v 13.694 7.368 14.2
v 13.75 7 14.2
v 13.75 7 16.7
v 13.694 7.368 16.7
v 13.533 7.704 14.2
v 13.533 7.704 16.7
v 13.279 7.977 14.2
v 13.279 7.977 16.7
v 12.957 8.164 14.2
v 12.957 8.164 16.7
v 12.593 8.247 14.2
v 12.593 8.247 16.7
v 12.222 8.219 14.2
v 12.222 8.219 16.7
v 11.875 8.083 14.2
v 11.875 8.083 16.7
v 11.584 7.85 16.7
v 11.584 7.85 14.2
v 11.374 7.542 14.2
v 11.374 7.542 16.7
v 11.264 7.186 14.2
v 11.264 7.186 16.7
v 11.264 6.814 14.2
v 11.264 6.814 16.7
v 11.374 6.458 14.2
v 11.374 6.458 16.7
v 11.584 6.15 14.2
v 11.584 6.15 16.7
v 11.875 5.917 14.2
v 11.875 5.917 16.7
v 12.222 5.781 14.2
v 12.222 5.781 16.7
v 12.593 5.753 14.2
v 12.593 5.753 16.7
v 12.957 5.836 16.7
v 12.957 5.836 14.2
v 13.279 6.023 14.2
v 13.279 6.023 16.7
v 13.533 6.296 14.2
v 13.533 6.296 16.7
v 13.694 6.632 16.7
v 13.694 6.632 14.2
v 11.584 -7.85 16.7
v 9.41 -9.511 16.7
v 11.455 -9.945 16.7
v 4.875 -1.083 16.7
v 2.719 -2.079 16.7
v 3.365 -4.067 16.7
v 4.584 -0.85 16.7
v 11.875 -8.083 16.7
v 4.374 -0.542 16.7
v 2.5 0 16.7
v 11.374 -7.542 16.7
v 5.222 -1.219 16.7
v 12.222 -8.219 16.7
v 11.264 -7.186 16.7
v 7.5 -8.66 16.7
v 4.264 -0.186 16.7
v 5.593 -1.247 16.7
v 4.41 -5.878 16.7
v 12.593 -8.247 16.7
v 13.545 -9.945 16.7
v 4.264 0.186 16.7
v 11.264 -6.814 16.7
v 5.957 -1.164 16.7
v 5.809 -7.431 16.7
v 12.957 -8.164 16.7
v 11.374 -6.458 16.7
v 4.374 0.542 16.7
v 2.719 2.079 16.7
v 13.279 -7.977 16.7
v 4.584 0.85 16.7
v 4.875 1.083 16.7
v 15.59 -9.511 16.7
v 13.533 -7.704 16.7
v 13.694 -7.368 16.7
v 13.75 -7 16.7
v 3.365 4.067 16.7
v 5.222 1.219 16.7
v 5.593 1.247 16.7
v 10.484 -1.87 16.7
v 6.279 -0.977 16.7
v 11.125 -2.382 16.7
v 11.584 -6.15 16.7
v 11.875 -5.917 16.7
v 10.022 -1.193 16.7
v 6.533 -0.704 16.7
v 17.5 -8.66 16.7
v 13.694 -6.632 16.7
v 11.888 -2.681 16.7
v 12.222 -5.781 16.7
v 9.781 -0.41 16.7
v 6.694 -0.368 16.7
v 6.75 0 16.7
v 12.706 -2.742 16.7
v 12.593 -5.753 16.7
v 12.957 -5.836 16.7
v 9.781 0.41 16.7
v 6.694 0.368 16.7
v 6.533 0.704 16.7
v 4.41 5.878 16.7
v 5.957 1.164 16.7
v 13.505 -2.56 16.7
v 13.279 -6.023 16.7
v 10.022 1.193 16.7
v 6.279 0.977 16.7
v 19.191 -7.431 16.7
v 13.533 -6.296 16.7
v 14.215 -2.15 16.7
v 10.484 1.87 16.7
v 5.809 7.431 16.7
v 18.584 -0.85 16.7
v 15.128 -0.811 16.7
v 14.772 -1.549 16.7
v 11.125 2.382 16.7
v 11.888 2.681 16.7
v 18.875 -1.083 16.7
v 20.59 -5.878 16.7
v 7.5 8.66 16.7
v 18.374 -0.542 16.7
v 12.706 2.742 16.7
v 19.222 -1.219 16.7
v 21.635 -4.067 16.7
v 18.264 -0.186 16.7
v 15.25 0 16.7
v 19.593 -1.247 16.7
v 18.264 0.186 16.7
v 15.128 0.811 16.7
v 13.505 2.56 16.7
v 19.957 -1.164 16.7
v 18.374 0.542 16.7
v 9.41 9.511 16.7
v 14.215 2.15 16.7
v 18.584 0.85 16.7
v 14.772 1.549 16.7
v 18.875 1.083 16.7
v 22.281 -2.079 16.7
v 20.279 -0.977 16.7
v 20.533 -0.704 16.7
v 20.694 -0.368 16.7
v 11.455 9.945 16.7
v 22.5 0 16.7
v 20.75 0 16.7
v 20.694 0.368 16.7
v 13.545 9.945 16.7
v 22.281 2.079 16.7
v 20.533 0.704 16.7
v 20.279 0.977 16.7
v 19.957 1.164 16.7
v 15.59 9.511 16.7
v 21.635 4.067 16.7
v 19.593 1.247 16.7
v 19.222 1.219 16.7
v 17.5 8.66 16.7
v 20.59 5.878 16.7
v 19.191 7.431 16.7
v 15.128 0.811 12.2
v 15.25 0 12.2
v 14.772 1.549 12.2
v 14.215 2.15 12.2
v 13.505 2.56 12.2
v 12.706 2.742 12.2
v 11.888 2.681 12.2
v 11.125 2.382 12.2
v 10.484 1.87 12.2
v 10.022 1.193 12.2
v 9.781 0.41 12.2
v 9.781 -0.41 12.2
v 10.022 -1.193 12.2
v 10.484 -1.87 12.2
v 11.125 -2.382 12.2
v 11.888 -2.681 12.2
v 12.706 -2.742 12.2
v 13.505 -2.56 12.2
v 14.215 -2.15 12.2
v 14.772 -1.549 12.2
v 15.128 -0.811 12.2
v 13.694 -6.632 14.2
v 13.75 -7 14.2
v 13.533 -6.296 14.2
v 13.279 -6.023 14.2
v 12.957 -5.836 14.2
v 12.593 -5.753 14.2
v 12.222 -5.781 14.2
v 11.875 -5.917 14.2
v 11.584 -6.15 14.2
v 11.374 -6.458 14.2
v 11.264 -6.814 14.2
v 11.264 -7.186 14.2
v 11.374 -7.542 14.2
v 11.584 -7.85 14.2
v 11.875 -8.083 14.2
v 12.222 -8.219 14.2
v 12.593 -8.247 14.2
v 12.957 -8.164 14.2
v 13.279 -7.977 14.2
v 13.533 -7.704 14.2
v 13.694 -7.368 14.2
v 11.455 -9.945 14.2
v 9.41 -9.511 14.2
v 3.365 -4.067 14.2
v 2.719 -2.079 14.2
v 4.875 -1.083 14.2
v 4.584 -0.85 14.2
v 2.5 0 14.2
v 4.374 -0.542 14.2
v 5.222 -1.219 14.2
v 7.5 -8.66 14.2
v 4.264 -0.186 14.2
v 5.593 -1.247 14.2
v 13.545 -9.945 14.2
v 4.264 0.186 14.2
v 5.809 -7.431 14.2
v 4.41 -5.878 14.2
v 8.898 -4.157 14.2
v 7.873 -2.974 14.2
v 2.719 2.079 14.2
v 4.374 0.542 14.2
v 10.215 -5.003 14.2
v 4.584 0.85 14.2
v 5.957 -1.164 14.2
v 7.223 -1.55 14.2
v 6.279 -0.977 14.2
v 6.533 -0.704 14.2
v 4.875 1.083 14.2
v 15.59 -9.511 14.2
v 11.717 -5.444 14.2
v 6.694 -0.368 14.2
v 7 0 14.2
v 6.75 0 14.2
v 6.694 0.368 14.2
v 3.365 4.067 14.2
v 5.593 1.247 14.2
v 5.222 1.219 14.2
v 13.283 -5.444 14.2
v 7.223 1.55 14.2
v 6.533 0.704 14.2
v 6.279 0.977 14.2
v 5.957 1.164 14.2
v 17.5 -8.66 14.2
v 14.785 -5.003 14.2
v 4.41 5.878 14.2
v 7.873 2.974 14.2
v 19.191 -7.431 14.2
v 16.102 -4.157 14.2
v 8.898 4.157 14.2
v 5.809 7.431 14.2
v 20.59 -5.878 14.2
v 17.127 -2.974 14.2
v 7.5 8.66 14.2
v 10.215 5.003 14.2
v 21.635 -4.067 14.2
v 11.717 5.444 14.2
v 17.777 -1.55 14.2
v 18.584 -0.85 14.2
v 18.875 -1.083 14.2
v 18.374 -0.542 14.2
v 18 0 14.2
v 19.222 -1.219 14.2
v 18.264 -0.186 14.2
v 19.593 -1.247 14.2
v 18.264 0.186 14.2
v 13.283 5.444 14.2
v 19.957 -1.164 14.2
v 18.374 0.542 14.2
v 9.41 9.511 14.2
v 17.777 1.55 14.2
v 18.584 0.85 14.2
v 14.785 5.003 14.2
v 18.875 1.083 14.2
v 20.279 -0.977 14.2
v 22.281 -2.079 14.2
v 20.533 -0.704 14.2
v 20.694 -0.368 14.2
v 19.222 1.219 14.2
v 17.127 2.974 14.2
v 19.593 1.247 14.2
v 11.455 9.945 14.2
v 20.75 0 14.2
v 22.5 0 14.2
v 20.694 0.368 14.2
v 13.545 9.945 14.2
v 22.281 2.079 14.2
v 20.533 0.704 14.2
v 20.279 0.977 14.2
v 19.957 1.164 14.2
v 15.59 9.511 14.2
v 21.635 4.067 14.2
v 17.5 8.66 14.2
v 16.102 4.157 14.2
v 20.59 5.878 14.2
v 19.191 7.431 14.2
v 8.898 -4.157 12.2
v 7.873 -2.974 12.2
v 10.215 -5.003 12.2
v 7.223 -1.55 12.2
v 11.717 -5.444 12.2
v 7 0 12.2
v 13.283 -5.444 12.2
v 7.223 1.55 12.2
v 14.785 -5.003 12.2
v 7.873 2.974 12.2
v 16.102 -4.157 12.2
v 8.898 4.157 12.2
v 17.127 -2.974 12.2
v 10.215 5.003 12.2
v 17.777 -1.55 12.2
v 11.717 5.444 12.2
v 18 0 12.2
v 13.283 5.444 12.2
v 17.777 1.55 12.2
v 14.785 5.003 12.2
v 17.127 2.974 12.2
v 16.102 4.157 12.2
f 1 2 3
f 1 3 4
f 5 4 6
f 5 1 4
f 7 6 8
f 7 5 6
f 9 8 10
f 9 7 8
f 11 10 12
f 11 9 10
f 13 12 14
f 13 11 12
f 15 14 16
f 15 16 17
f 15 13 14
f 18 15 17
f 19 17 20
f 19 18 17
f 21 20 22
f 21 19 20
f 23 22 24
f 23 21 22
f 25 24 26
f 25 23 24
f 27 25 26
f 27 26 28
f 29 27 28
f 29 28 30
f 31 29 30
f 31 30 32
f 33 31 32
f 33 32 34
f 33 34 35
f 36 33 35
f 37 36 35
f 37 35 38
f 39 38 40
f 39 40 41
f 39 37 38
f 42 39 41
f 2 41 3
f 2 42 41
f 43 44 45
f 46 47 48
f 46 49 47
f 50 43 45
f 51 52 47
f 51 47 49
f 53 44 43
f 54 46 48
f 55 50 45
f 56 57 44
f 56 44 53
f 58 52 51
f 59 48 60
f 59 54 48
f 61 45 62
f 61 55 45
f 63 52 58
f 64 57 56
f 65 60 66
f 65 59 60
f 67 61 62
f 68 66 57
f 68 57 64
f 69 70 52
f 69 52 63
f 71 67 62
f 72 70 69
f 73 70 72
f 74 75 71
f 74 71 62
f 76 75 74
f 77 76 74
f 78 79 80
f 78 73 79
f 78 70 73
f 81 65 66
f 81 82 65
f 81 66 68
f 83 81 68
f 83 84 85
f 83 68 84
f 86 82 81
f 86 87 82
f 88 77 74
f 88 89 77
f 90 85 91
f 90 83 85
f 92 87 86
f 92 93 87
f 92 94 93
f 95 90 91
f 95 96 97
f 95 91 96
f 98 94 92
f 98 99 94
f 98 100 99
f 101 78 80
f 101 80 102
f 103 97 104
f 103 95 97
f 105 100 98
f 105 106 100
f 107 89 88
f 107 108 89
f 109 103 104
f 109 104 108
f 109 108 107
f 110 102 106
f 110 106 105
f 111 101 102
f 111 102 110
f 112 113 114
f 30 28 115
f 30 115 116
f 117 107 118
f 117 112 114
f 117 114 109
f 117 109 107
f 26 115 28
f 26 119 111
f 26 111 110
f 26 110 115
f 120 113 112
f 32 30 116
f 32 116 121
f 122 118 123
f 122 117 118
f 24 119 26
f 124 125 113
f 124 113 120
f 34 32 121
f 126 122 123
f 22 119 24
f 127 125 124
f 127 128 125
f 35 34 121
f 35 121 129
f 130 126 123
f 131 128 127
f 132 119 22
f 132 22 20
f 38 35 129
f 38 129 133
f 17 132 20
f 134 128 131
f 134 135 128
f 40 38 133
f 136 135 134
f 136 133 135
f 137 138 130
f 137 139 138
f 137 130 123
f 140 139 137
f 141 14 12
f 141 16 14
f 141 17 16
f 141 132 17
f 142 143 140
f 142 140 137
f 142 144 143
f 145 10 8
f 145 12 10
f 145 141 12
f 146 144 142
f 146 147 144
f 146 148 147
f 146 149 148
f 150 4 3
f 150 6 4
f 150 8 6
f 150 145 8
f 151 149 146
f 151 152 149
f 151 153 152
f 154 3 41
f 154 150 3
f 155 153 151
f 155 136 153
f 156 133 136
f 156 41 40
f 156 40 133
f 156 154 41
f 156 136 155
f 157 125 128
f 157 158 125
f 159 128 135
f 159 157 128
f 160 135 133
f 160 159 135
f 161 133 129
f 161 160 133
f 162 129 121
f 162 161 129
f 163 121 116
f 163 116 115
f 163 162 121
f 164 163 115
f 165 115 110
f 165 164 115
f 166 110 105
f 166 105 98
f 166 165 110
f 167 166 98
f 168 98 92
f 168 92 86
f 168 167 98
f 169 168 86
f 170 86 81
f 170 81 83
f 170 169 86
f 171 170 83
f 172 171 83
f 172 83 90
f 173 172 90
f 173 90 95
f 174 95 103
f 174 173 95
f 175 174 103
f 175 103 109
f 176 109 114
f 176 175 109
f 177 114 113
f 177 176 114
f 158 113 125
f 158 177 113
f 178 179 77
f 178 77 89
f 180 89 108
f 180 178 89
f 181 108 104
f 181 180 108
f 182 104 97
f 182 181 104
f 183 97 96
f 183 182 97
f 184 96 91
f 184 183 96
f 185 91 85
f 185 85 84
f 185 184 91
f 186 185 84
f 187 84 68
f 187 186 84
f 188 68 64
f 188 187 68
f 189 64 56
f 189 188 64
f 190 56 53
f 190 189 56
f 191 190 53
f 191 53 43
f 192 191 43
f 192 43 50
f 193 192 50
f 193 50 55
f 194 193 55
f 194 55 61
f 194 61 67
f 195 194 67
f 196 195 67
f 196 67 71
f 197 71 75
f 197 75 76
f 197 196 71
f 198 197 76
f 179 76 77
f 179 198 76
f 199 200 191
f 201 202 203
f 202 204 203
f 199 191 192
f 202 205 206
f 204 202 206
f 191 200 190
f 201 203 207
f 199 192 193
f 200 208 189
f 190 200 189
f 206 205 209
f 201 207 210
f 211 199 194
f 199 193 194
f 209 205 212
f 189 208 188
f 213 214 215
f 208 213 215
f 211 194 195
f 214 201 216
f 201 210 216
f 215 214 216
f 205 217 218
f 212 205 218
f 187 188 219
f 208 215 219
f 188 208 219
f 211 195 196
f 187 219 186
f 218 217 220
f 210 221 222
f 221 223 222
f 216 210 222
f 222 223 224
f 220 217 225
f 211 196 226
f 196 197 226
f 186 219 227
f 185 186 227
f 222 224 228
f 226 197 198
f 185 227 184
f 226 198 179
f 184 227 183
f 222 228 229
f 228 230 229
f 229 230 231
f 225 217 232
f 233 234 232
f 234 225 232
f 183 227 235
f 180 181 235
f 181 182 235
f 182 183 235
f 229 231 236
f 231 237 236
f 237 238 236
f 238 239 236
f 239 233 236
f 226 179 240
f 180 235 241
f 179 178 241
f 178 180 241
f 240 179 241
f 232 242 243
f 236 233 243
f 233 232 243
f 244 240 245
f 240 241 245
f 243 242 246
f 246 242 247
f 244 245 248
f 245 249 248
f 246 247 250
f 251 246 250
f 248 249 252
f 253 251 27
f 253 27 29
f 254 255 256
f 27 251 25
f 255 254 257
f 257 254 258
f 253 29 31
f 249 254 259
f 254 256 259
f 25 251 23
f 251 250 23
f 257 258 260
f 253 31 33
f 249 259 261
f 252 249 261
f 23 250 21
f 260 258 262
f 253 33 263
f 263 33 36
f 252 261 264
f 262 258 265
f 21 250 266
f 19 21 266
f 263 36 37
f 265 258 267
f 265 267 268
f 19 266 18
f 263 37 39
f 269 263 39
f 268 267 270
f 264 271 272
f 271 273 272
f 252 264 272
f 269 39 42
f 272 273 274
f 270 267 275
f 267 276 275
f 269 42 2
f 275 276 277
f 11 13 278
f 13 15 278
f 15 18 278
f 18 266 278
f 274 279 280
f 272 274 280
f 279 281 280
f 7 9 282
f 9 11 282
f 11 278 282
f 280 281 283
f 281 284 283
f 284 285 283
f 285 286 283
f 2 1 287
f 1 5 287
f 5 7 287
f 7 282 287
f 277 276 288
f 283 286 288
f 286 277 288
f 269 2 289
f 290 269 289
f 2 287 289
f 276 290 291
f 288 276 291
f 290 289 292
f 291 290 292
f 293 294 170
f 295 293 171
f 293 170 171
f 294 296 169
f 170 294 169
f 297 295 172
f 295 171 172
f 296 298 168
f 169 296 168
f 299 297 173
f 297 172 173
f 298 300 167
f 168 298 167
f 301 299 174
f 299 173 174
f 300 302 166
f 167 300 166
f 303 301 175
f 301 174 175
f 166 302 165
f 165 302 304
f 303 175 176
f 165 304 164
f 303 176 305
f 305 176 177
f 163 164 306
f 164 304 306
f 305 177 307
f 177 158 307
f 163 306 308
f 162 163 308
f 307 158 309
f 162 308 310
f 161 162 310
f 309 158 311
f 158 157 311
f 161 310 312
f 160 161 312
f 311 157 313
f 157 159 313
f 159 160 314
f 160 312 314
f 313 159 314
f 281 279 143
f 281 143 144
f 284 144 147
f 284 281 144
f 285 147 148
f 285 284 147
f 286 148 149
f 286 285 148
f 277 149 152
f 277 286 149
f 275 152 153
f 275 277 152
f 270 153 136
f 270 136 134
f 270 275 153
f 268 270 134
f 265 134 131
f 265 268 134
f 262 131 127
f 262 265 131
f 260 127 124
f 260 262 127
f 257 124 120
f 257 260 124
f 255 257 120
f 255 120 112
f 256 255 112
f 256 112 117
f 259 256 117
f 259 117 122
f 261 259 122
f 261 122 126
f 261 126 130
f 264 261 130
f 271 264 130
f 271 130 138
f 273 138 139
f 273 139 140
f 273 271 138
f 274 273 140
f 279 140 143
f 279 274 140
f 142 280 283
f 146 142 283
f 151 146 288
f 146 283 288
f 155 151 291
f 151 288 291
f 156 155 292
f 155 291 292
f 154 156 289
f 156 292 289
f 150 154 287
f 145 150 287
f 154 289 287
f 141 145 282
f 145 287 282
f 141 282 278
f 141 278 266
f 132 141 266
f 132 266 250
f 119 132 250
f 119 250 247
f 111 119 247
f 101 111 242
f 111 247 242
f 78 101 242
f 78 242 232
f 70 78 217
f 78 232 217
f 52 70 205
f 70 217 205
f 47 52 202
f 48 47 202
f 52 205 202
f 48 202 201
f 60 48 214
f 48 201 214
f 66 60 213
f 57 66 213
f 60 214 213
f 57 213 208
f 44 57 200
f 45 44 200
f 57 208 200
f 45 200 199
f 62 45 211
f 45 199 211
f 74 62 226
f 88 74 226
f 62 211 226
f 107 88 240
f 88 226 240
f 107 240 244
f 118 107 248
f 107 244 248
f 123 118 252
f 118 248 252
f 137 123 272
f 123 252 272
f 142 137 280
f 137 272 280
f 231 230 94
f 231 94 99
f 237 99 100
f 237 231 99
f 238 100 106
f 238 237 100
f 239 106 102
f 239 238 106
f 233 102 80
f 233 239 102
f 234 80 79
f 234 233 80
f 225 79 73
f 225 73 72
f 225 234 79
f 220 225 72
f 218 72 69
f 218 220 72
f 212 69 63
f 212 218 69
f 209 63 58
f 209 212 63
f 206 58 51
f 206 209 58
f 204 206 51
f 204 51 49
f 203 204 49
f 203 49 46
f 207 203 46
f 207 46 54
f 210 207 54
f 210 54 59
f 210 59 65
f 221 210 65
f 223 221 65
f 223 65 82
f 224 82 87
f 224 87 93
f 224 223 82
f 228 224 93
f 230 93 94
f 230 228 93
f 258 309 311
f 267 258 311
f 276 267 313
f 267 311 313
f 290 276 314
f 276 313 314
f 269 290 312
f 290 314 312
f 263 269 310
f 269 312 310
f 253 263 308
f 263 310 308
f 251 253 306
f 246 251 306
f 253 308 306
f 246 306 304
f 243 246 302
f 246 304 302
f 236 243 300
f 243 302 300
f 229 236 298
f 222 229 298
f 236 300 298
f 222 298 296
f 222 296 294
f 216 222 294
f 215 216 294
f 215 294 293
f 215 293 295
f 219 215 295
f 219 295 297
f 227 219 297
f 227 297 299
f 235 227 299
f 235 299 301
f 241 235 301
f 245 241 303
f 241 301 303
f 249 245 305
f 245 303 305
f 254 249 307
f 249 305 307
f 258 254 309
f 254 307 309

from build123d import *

# Parameters (mm, degrees)
SPLINE_HUB_ENVELOPE_START             = 12.2
SPLINE_HUB_ENVELOPE_PROFILE_R         = 5.5
SPLINE_HUB_ENVELOPE_PROFILE_R_2       = 2.75
SPLINE_HUB_ENVELOPE_DEPTH             = 2
DISC_D20_PCD14_TAP_DRILLS_START       = 14.2
DISC_D20_PCD14_TAP_DRILLS_PROFILE_R   = 10
DISC_D20_PCD14_TAP_DRILLS_PROFILE_R_2 = 2.75
DISC_D20_PCD14_TAP_DRILLS_PROFILE_R_3 = 1.25
DISC_D20_PCD14_TAP_DRILLS_DEPTH       = 2.5


with BuildPart() as part:
    # Spline_hub_envelope_Profile → Spline_hub_envelope (new body)
    with BuildSketch(Plane.XY.offset(SPLINE_HUB_ENVELOPE_START)):
        with Locations((12.5, 0)):
            Circle(SPLINE_HUB_ENVELOPE_PROFILE_R)
        with Locations((12.5, 0)):
            Circle(SPLINE_HUB_ENVELOPE_PROFILE_R_2, mode=Mode.SUBTRACT)
    extrude(amount=SPLINE_HUB_ENVELOPE_DEPTH)

    # Disc_D20_PCD14_tap_drills_Profile → Disc_D20_PCD14_tap_drills (add)
    with BuildSketch(Plane.XY.offset(DISC_D20_PCD14_TAP_DRILLS_START)):
        with Locations((12.5, 0)):
            Circle(DISC_D20_PCD14_TAP_DRILLS_PROFILE_R)
        with Locations((12.5, 0)):
            Circle(DISC_D20_PCD14_TAP_DRILLS_PROFILE_R_2, mode=Mode.SUBTRACT)
        with Locations((19.5, 0)):
            Circle(DISC_D20_PCD14_TAP_DRILLS_PROFILE_R_3, mode=Mode.SUBTRACT)
        with Locations((5.5, 0)):
            Circle(DISC_D20_PCD14_TAP_DRILLS_PROFILE_R_3, mode=Mode.SUBTRACT)
        with Locations((12.5, 7)):
            Circle(DISC_D20_PCD14_TAP_DRILLS_PROFILE_R_3, mode=Mode.SUBTRACT)
        with Locations((12.5, -7)):
            Circle(DISC_D20_PCD14_TAP_DRILLS_PROFILE_R_3, mode=Mode.SUBTRACT)
    extrude(amount=DISC_D20_PCD14_TAP_DRILLS_DEPTH)


solid = part.part
